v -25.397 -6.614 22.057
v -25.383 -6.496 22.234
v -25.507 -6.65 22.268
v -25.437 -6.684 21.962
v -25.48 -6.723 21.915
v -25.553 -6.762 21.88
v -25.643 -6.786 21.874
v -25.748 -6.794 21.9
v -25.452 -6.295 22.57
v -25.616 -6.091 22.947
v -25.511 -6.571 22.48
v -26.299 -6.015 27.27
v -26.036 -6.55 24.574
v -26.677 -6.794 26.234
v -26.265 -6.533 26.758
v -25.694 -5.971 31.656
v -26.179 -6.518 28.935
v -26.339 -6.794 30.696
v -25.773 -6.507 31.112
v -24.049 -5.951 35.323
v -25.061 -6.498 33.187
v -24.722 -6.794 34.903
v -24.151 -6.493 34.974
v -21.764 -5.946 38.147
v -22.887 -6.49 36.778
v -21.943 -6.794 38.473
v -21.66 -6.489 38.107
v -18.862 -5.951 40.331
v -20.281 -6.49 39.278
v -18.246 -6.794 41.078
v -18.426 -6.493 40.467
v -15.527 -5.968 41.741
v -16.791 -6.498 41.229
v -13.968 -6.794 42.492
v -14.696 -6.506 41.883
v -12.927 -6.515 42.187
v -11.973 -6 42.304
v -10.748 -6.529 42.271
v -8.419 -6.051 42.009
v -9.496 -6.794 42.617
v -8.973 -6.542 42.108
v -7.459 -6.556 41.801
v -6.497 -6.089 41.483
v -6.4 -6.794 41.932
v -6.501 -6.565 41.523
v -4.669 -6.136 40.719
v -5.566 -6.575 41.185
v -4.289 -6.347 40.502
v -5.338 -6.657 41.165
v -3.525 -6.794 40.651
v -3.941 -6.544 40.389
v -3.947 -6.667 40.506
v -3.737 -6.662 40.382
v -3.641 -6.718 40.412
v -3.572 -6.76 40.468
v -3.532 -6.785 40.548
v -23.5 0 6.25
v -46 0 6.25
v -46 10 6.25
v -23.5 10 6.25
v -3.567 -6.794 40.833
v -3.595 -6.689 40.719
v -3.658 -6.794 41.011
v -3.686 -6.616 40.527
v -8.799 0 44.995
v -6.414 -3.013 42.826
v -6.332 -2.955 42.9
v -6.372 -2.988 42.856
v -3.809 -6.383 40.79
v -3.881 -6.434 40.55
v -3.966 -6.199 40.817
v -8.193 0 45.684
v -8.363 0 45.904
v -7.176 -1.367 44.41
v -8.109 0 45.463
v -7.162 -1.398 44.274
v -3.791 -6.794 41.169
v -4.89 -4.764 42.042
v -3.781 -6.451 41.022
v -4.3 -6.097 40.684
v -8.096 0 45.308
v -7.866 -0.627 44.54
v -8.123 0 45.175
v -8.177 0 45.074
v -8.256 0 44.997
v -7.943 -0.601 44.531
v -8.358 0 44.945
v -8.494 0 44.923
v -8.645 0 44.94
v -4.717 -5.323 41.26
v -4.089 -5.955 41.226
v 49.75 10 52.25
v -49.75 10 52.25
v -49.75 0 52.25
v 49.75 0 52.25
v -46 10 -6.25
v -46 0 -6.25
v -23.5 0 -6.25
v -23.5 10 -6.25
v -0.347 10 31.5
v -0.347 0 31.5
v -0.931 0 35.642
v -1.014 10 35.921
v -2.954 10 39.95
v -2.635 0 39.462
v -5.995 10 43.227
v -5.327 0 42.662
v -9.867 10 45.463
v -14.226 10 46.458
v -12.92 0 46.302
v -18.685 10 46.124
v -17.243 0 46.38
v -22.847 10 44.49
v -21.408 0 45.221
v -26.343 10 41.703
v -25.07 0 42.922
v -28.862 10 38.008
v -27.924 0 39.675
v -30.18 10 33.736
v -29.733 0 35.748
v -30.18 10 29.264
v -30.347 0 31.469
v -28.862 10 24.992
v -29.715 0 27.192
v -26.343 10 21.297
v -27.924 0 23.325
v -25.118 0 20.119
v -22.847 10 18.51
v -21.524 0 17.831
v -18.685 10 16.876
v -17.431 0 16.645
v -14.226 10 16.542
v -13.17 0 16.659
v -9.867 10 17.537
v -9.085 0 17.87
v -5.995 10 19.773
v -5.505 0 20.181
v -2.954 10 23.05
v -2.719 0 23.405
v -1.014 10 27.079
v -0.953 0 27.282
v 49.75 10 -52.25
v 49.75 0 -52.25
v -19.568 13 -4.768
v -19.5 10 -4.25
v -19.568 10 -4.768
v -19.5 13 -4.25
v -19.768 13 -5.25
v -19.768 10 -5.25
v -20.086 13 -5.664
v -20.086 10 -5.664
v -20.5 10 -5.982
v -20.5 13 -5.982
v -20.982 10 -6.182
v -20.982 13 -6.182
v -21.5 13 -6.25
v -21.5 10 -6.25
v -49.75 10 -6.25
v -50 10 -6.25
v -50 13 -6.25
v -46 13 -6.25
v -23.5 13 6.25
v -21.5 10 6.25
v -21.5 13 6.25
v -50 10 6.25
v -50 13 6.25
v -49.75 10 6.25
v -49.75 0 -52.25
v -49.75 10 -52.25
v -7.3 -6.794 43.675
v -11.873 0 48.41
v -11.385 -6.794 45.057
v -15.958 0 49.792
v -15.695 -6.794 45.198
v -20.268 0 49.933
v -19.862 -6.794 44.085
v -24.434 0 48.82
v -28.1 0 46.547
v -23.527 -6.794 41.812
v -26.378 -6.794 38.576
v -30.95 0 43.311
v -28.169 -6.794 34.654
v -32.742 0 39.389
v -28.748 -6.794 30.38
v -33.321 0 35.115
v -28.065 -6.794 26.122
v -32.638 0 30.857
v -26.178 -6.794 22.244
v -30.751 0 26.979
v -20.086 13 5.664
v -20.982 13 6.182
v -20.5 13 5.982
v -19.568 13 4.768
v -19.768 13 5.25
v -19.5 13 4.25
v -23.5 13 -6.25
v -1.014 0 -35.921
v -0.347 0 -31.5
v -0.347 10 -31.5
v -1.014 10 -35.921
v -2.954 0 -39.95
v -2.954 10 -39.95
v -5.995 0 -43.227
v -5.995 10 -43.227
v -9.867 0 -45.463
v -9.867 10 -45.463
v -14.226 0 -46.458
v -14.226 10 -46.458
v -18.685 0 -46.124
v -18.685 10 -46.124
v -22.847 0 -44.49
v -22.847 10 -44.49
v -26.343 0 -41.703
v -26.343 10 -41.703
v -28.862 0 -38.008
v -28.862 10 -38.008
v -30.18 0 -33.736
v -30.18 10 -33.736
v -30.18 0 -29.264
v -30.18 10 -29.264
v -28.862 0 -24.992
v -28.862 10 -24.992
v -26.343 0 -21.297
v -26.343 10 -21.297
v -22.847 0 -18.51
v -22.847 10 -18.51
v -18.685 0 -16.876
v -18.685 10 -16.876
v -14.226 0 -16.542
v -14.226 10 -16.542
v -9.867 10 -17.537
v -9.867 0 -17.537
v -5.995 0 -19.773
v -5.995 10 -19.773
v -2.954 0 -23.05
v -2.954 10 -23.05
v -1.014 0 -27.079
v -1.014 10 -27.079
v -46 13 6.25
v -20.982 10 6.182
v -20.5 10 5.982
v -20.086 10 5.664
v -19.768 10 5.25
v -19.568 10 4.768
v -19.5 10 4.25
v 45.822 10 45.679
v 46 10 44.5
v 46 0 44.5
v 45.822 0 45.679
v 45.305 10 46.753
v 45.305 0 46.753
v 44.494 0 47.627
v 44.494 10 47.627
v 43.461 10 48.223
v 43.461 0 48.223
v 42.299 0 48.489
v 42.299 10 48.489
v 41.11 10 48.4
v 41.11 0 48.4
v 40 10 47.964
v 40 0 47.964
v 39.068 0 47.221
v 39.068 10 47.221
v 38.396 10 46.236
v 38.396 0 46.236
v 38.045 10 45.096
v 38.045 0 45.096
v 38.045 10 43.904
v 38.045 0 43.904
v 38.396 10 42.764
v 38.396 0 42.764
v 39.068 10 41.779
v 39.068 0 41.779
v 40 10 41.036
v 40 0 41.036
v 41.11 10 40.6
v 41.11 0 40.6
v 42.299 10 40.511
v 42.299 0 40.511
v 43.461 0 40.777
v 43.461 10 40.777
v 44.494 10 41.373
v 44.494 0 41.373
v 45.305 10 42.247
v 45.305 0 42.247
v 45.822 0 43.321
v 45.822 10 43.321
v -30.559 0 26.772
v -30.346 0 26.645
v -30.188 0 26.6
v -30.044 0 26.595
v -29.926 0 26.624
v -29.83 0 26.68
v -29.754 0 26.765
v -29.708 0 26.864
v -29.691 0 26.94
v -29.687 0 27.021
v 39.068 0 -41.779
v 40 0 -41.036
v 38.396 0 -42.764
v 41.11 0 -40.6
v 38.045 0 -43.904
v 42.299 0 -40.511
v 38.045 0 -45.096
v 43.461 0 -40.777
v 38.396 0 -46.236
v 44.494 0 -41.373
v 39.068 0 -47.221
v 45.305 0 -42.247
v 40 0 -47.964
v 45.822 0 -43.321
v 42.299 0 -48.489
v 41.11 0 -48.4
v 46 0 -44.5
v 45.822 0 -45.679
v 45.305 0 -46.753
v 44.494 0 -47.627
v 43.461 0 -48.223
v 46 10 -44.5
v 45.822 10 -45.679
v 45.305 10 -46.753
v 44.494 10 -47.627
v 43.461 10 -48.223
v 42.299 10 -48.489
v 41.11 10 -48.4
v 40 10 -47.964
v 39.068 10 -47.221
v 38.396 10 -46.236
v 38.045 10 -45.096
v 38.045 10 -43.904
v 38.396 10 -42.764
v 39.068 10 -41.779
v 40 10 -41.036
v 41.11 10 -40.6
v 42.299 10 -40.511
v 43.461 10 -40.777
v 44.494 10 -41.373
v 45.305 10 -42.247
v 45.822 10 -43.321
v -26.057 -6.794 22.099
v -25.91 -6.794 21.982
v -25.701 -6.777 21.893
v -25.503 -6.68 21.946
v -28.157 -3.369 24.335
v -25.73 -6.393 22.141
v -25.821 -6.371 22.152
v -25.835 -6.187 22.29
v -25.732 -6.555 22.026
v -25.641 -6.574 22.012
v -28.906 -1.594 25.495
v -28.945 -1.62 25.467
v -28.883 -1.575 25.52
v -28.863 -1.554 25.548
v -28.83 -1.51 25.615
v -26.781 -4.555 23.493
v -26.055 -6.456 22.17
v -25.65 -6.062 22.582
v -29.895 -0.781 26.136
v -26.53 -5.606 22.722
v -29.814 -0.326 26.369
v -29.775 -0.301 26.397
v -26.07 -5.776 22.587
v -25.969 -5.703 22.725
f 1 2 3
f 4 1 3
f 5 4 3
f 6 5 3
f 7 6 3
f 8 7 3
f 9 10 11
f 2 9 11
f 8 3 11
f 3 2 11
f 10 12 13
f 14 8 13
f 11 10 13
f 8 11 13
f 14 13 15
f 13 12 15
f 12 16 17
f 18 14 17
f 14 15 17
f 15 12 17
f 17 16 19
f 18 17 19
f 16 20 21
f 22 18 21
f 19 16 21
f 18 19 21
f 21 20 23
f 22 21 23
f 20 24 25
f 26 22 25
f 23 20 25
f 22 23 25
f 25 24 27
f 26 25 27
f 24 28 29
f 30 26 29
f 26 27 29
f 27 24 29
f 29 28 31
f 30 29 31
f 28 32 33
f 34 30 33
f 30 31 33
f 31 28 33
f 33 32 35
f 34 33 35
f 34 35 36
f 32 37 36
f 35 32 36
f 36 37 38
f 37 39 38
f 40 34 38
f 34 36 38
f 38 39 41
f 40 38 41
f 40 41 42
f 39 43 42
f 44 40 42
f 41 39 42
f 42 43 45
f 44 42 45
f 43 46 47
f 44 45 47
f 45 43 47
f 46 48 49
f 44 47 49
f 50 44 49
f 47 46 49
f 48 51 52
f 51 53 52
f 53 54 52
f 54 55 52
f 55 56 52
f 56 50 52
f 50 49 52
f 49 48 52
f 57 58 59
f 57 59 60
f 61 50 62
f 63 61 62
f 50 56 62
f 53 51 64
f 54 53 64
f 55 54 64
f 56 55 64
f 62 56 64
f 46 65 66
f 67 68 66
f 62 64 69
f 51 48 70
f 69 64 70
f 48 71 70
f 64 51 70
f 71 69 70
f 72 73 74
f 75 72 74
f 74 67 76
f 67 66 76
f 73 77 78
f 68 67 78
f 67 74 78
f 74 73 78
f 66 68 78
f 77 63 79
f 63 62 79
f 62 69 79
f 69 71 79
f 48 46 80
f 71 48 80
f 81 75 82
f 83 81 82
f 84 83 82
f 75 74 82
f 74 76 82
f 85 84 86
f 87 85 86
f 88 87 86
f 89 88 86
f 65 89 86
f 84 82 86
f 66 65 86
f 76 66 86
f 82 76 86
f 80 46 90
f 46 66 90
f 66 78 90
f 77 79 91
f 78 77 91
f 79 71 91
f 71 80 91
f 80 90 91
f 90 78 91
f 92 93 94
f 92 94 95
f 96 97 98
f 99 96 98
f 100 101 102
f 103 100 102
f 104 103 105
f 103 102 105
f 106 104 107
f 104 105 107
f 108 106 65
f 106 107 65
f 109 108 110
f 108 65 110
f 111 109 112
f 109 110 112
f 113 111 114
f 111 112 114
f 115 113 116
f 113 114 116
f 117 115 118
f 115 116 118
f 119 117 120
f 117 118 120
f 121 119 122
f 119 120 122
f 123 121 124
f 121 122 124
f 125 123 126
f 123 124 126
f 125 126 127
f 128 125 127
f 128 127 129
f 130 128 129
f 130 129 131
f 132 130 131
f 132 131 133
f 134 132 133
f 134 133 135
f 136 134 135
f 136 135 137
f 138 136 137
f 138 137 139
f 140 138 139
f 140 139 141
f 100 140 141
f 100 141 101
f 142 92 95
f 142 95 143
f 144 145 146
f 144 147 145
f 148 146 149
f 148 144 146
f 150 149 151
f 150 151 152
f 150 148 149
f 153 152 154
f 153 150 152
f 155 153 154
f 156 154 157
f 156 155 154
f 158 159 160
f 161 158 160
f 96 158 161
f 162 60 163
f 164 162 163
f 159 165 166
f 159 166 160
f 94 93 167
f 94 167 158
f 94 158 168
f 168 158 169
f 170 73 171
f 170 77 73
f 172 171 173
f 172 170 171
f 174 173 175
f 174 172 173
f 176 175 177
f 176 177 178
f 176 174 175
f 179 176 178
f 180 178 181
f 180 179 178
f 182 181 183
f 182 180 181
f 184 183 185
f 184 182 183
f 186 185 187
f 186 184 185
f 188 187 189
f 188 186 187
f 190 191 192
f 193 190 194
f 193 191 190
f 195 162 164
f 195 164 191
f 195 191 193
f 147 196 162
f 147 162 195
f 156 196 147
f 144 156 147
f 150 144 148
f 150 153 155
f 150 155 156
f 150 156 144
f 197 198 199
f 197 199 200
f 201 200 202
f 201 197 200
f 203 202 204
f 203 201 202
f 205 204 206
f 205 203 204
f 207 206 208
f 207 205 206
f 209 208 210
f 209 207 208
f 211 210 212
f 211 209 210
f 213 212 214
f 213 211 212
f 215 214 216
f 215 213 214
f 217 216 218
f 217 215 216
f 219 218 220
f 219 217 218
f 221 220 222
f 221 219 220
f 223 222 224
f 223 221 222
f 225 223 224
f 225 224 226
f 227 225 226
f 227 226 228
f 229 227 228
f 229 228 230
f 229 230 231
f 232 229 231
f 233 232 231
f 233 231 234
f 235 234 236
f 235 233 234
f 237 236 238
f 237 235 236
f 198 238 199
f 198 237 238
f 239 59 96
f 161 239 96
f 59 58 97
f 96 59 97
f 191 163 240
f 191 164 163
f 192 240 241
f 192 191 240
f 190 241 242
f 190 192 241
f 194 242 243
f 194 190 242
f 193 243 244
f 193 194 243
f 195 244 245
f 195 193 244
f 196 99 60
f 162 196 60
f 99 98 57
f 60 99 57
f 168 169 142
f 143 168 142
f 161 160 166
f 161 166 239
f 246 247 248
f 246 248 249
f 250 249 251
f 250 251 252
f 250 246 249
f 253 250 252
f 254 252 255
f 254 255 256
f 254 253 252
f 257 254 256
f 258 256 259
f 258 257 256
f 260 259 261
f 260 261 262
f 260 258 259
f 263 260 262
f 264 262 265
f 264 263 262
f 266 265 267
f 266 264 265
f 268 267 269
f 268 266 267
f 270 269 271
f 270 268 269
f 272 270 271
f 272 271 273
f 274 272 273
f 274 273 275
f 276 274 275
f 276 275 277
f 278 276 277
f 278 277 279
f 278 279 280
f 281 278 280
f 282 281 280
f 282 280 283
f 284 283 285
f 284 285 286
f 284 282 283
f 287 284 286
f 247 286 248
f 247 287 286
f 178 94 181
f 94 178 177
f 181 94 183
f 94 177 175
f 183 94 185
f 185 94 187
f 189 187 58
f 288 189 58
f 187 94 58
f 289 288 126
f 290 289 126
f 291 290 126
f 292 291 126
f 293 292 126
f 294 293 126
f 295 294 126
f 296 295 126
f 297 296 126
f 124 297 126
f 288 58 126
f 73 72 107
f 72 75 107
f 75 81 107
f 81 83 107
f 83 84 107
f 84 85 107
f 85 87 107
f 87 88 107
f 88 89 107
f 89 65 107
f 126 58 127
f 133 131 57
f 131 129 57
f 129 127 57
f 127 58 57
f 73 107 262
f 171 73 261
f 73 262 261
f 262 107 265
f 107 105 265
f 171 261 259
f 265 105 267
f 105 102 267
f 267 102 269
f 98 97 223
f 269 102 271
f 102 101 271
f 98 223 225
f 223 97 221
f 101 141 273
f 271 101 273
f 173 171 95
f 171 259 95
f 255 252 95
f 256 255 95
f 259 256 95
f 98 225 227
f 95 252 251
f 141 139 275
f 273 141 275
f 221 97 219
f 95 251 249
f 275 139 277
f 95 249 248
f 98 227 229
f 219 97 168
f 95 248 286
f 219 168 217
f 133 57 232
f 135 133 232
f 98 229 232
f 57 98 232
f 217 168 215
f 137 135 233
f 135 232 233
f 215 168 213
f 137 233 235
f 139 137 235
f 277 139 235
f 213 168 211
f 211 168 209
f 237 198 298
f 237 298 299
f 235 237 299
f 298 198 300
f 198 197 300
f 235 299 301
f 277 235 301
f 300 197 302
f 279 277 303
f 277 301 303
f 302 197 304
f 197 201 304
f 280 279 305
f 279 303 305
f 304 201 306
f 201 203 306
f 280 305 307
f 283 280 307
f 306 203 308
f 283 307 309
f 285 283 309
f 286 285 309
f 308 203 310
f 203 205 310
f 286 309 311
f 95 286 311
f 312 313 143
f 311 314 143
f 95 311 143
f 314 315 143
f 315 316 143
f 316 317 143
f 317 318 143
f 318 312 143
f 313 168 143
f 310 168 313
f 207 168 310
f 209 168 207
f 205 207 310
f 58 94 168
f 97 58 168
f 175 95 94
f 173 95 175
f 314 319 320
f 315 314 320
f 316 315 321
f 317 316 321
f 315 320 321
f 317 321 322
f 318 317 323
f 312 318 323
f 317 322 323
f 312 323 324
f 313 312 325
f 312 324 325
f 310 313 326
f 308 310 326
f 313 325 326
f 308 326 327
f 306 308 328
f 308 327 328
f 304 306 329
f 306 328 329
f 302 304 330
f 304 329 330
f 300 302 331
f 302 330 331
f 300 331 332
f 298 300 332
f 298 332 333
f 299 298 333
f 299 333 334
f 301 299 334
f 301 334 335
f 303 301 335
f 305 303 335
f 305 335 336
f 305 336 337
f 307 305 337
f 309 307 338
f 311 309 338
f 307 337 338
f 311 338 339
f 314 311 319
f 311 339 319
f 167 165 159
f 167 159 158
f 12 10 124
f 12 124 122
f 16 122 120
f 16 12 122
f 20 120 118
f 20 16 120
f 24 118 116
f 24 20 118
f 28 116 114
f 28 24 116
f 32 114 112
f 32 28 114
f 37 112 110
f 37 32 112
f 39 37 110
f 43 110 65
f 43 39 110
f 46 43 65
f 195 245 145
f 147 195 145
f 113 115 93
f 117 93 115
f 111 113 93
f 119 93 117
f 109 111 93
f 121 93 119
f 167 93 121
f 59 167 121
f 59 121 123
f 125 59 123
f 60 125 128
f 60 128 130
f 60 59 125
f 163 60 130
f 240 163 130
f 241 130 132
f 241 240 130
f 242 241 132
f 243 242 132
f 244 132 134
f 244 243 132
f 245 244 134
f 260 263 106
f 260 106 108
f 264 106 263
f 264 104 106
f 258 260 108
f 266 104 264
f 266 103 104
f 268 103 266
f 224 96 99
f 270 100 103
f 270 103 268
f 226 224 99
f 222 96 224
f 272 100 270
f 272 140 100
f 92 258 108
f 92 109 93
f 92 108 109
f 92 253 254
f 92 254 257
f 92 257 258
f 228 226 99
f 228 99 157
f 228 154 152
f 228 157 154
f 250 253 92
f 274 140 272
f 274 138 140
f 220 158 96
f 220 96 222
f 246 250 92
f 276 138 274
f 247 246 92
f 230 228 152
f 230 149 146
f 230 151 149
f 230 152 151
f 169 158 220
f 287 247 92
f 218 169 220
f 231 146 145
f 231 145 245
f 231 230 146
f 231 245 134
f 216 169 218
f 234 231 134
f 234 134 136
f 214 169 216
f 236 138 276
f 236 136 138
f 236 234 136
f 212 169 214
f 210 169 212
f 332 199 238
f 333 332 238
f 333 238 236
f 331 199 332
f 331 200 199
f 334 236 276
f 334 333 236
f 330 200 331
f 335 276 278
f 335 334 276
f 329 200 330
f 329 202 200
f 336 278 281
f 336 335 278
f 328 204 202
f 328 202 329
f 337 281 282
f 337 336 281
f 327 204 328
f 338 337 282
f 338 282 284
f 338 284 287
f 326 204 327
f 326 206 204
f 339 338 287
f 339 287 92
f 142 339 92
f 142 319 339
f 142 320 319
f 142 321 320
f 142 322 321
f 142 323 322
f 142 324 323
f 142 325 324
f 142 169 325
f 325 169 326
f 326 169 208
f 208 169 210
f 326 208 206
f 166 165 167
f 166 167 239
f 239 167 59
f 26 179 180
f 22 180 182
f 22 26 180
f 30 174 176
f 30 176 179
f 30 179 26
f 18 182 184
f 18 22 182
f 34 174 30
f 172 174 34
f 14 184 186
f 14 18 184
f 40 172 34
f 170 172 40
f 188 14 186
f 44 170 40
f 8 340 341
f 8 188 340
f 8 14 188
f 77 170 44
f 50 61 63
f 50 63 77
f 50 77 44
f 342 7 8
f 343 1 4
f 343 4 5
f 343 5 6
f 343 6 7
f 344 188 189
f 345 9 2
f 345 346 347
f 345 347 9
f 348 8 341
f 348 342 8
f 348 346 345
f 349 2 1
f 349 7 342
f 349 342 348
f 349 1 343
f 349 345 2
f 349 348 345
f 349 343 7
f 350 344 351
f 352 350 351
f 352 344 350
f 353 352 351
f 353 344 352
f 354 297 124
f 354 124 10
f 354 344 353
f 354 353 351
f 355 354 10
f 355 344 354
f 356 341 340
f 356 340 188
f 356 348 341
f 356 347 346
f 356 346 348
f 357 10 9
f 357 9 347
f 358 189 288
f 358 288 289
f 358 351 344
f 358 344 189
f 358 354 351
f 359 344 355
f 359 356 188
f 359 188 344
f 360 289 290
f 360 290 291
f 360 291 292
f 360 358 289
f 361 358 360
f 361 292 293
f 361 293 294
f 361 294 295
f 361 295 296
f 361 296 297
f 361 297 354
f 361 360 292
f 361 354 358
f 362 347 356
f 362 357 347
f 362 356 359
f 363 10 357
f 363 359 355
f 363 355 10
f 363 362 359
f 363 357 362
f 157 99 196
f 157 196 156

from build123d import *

# Parameters (mm, degrees)
SKETCH2_W           = 100
SKETCH2_H           = 105
BOSS_EXTRUDE1_DEPTH = 10
CUT_EXTRUDE1_REACH  = 75.186
SKETCH5_R           = 15
SKETCH5_R_2         = 5
CUT_EXTRUDE2_REACH  = 75.186
SKETCH6_W           = 22.5
SKETCH6_H           = 12.5
FILLET2_R           = 0.5
CUT_EXTRUDE3_REACH  = 76.42
SKETCH12_R          = 4
SKETCH13_W          = 4
SKETCH13_H          = 12.5
BOSS_EXTRUDE2_DEPTH = 3
FILLET3_R           = 2
CUT_EXTRUDE6_REACH  = 76.42
SKETCH14_W          = 154.448813283
SKETCH14_H          = 123.004866117
SKETCH14_W_2        = 99.5
SKETCH14_H_2        = 104.5


with BuildPart() as part:
    # Sketch2 → Boss-Extrude1 (new body)
    with BuildSketch(Plane(origin=(0, 0, 0), x_dir=(1, 0, 0), z_dir=(0, 1, 0))):
        Rectangle(SKETCH2_W, SKETCH2_H)
    extrude(amount=BOSS_EXTRUDE1_DEPTH)

    # Sketch5 → Cut-Extrude1 (cut, up to next)
    with BuildSketch(Plane.XZ, mode=Mode.PRIVATE) as cut_extrude1_sk1:
        with Locations((-15.347413929, 31.5)):
            Circle(SKETCH5_R)
    cut_extrude1_tool1 = extrude(cut_extrude1_sk1.sketch, amount=-CUT_EXTRUDE1_REACH, mode=Mode.PRIVATE) & part.part
    # Sketch5 → Cut-Extrude1 (cut, up to next)
    with BuildSketch(Plane.XZ, mode=Mode.PRIVATE) as cut_extrude1_sk2:
        with Locations((-40, 0)):
            Circle(SKETCH5_R_2)
    cut_extrude1_tool2 = extrude(cut_extrude1_sk2.sketch, amount=-CUT_EXTRUDE1_REACH, mode=Mode.PRIVATE) & part.part
    cut_extrude1_1 = cut_extrude1_tool1.solids().sort_by_distance((-15.347414, 0, 31.5))[0]
    add(cut_extrude1_1, mode=Mode.SUBTRACT)
    cut_extrude1_2 = cut_extrude1_tool2.solids().sort_by_distance((-40, 0, 0))[0]
    add(cut_extrude1_2, mode=Mode.SUBTRACT)
    cut_extrude1 = cut_extrude1_1 + cut_extrude1_2  # Cut-Extrude1 as one shape, for the pattern or mirror that repeats it

    # Mirror1: Cut-Extrude1 across plane
    add(cut_extrude1.mirror(Plane.XY), mode=Mode.SUBTRACT)

    # Sketch6 → Cut-Extrude2 (cut, up to next)
    with BuildSketch(Plane.XZ, mode=Mode.PRIVATE) as cut_extrude2_sk1:
        with Locations((-34.75, 0)):
            Rectangle(SKETCH6_W, SKETCH6_H)
    cut_extrude2_tool1 = extrude(cut_extrude2_sk1.sketch, amount=-CUT_EXTRUDE2_REACH, mode=Mode.PRIVATE) & part.part
    add(cut_extrude2_tool1.solids().sort_by_distance((-34.75, 0, 0))[0], mode=Mode.SUBTRACT)

    # Sweep1: sweep along a path in Sketch11
    with BuildLine(Plane(origin=(7.914589695, 0, 7.643030426), x_dir=(0, -1, 0), z_dir=(0.7193398003386426, 0, 0.6946583704590061))) as sweep1_path:
        Line((0, -49.687749169), (6.793793585, -43.105226771))
    # Sketch7 → Sweep1 (sweep)
    with BuildSketch(Plane.XZ):
        with BuildLine():
            ThreePointArc((-6.352107338, 43.503518623), (-25.0878405, 42.907194669), (-28.61191488, 24.496214272))
            ThreePointArc((-28.61191488, 24.496214272), (-28.155696018, 46.500017309), (-6.352107338, 43.503518623))
        make_face()
    sweep(path=sweep1_path.line)

    # Fillet2
    fillet2_edges = [part.edges().sort_by_distance(p)[0] for p in [
        (-26.325612738, -3.396896793, 22.128679098),
        (-4.065805196, -3.396896793, 41.135983449),
        (-20.515236217, -6.793793585, 38.172124321),
    ]]
    fillet(fillet2_edges, radius=FILLET2_R)

    # Sketch12 → Cut-Extrude3 (cut, up to next)
    with BuildSketch(Plane(origin=(0, 10, 0), x_dir=(1, 0, 0), z_dir=(0, 1, 0)), mode=Mode.PRIVATE) as cut_extrude3_sk1:
        with Locations((42, 44.5)):
            Circle(SKETCH12_R)
    cut_extrude3_tool1 = extrude(cut_extrude3_sk1.sketch, amount=-CUT_EXTRUDE3_REACH, mode=Mode.PRIVATE) & part.part
    cut_extrude3 = cut_extrude3_tool1.solids().sort_by_distance((42, 10, -44.5))[0]
    add(cut_extrude3, mode=Mode.SUBTRACT)

    # Mirror2: Cut-Extrude3 across plane
    add(cut_extrude3.mirror(Plane.XY), mode=Mode.SUBTRACT)

    # Sketch13 → Boss-Extrude2 (add)
    with BuildSketch(Plane(origin=(0, 10, 0), x_dir=(1, 0, 0), z_dir=(0, 1, 0))):
        with Locations((-48, 0)):
            Rectangle(SKETCH13_W, SKETCH13_H)
        with Locations((-21.5, 0)):
            Rectangle(SKETCH13_W, SKETCH13_H)
    extrude(amount=BOSS_EXTRUDE2_DEPTH)

    # Fillet3
    fillet3_edges = [part.edges().sort_by_distance(p)[0] for p in [
        (-19.5, 11.5, -6.25),
        (-19.5, 11.5, 6.25),
    ]]
    fillet(fillet3_edges, radius=FILLET3_R)

    # Sketch14 → Cut-Extrude6 (cut, up to next)
    with BuildSketch(Plane(origin=(0, 10, 0), x_dir=(1, 0, 0), z_dir=(0, 1, 0)), mode=Mode.PRIVATE) as cut_extrude6_sk1:
        with Locations((-5.953267194, 1.602475316)):
            Rectangle(SKETCH14_W, SKETCH14_H)
        Rectangle(SKETCH14_W_2, SKETCH14_H_2, mode=Mode.SUBTRACT)
    cut_extrude6_tool1 = extrude(cut_extrude6_sk1.sketch, amount=-CUT_EXTRUDE6_REACH, mode=Mode.PRIVATE) & part.part
    add(cut_extrude6_tool1.solids().sort_by_distance((-5.953267, 10, -61.130456))[0], mode=Mode.SUBTRACT)


solid = part.part
